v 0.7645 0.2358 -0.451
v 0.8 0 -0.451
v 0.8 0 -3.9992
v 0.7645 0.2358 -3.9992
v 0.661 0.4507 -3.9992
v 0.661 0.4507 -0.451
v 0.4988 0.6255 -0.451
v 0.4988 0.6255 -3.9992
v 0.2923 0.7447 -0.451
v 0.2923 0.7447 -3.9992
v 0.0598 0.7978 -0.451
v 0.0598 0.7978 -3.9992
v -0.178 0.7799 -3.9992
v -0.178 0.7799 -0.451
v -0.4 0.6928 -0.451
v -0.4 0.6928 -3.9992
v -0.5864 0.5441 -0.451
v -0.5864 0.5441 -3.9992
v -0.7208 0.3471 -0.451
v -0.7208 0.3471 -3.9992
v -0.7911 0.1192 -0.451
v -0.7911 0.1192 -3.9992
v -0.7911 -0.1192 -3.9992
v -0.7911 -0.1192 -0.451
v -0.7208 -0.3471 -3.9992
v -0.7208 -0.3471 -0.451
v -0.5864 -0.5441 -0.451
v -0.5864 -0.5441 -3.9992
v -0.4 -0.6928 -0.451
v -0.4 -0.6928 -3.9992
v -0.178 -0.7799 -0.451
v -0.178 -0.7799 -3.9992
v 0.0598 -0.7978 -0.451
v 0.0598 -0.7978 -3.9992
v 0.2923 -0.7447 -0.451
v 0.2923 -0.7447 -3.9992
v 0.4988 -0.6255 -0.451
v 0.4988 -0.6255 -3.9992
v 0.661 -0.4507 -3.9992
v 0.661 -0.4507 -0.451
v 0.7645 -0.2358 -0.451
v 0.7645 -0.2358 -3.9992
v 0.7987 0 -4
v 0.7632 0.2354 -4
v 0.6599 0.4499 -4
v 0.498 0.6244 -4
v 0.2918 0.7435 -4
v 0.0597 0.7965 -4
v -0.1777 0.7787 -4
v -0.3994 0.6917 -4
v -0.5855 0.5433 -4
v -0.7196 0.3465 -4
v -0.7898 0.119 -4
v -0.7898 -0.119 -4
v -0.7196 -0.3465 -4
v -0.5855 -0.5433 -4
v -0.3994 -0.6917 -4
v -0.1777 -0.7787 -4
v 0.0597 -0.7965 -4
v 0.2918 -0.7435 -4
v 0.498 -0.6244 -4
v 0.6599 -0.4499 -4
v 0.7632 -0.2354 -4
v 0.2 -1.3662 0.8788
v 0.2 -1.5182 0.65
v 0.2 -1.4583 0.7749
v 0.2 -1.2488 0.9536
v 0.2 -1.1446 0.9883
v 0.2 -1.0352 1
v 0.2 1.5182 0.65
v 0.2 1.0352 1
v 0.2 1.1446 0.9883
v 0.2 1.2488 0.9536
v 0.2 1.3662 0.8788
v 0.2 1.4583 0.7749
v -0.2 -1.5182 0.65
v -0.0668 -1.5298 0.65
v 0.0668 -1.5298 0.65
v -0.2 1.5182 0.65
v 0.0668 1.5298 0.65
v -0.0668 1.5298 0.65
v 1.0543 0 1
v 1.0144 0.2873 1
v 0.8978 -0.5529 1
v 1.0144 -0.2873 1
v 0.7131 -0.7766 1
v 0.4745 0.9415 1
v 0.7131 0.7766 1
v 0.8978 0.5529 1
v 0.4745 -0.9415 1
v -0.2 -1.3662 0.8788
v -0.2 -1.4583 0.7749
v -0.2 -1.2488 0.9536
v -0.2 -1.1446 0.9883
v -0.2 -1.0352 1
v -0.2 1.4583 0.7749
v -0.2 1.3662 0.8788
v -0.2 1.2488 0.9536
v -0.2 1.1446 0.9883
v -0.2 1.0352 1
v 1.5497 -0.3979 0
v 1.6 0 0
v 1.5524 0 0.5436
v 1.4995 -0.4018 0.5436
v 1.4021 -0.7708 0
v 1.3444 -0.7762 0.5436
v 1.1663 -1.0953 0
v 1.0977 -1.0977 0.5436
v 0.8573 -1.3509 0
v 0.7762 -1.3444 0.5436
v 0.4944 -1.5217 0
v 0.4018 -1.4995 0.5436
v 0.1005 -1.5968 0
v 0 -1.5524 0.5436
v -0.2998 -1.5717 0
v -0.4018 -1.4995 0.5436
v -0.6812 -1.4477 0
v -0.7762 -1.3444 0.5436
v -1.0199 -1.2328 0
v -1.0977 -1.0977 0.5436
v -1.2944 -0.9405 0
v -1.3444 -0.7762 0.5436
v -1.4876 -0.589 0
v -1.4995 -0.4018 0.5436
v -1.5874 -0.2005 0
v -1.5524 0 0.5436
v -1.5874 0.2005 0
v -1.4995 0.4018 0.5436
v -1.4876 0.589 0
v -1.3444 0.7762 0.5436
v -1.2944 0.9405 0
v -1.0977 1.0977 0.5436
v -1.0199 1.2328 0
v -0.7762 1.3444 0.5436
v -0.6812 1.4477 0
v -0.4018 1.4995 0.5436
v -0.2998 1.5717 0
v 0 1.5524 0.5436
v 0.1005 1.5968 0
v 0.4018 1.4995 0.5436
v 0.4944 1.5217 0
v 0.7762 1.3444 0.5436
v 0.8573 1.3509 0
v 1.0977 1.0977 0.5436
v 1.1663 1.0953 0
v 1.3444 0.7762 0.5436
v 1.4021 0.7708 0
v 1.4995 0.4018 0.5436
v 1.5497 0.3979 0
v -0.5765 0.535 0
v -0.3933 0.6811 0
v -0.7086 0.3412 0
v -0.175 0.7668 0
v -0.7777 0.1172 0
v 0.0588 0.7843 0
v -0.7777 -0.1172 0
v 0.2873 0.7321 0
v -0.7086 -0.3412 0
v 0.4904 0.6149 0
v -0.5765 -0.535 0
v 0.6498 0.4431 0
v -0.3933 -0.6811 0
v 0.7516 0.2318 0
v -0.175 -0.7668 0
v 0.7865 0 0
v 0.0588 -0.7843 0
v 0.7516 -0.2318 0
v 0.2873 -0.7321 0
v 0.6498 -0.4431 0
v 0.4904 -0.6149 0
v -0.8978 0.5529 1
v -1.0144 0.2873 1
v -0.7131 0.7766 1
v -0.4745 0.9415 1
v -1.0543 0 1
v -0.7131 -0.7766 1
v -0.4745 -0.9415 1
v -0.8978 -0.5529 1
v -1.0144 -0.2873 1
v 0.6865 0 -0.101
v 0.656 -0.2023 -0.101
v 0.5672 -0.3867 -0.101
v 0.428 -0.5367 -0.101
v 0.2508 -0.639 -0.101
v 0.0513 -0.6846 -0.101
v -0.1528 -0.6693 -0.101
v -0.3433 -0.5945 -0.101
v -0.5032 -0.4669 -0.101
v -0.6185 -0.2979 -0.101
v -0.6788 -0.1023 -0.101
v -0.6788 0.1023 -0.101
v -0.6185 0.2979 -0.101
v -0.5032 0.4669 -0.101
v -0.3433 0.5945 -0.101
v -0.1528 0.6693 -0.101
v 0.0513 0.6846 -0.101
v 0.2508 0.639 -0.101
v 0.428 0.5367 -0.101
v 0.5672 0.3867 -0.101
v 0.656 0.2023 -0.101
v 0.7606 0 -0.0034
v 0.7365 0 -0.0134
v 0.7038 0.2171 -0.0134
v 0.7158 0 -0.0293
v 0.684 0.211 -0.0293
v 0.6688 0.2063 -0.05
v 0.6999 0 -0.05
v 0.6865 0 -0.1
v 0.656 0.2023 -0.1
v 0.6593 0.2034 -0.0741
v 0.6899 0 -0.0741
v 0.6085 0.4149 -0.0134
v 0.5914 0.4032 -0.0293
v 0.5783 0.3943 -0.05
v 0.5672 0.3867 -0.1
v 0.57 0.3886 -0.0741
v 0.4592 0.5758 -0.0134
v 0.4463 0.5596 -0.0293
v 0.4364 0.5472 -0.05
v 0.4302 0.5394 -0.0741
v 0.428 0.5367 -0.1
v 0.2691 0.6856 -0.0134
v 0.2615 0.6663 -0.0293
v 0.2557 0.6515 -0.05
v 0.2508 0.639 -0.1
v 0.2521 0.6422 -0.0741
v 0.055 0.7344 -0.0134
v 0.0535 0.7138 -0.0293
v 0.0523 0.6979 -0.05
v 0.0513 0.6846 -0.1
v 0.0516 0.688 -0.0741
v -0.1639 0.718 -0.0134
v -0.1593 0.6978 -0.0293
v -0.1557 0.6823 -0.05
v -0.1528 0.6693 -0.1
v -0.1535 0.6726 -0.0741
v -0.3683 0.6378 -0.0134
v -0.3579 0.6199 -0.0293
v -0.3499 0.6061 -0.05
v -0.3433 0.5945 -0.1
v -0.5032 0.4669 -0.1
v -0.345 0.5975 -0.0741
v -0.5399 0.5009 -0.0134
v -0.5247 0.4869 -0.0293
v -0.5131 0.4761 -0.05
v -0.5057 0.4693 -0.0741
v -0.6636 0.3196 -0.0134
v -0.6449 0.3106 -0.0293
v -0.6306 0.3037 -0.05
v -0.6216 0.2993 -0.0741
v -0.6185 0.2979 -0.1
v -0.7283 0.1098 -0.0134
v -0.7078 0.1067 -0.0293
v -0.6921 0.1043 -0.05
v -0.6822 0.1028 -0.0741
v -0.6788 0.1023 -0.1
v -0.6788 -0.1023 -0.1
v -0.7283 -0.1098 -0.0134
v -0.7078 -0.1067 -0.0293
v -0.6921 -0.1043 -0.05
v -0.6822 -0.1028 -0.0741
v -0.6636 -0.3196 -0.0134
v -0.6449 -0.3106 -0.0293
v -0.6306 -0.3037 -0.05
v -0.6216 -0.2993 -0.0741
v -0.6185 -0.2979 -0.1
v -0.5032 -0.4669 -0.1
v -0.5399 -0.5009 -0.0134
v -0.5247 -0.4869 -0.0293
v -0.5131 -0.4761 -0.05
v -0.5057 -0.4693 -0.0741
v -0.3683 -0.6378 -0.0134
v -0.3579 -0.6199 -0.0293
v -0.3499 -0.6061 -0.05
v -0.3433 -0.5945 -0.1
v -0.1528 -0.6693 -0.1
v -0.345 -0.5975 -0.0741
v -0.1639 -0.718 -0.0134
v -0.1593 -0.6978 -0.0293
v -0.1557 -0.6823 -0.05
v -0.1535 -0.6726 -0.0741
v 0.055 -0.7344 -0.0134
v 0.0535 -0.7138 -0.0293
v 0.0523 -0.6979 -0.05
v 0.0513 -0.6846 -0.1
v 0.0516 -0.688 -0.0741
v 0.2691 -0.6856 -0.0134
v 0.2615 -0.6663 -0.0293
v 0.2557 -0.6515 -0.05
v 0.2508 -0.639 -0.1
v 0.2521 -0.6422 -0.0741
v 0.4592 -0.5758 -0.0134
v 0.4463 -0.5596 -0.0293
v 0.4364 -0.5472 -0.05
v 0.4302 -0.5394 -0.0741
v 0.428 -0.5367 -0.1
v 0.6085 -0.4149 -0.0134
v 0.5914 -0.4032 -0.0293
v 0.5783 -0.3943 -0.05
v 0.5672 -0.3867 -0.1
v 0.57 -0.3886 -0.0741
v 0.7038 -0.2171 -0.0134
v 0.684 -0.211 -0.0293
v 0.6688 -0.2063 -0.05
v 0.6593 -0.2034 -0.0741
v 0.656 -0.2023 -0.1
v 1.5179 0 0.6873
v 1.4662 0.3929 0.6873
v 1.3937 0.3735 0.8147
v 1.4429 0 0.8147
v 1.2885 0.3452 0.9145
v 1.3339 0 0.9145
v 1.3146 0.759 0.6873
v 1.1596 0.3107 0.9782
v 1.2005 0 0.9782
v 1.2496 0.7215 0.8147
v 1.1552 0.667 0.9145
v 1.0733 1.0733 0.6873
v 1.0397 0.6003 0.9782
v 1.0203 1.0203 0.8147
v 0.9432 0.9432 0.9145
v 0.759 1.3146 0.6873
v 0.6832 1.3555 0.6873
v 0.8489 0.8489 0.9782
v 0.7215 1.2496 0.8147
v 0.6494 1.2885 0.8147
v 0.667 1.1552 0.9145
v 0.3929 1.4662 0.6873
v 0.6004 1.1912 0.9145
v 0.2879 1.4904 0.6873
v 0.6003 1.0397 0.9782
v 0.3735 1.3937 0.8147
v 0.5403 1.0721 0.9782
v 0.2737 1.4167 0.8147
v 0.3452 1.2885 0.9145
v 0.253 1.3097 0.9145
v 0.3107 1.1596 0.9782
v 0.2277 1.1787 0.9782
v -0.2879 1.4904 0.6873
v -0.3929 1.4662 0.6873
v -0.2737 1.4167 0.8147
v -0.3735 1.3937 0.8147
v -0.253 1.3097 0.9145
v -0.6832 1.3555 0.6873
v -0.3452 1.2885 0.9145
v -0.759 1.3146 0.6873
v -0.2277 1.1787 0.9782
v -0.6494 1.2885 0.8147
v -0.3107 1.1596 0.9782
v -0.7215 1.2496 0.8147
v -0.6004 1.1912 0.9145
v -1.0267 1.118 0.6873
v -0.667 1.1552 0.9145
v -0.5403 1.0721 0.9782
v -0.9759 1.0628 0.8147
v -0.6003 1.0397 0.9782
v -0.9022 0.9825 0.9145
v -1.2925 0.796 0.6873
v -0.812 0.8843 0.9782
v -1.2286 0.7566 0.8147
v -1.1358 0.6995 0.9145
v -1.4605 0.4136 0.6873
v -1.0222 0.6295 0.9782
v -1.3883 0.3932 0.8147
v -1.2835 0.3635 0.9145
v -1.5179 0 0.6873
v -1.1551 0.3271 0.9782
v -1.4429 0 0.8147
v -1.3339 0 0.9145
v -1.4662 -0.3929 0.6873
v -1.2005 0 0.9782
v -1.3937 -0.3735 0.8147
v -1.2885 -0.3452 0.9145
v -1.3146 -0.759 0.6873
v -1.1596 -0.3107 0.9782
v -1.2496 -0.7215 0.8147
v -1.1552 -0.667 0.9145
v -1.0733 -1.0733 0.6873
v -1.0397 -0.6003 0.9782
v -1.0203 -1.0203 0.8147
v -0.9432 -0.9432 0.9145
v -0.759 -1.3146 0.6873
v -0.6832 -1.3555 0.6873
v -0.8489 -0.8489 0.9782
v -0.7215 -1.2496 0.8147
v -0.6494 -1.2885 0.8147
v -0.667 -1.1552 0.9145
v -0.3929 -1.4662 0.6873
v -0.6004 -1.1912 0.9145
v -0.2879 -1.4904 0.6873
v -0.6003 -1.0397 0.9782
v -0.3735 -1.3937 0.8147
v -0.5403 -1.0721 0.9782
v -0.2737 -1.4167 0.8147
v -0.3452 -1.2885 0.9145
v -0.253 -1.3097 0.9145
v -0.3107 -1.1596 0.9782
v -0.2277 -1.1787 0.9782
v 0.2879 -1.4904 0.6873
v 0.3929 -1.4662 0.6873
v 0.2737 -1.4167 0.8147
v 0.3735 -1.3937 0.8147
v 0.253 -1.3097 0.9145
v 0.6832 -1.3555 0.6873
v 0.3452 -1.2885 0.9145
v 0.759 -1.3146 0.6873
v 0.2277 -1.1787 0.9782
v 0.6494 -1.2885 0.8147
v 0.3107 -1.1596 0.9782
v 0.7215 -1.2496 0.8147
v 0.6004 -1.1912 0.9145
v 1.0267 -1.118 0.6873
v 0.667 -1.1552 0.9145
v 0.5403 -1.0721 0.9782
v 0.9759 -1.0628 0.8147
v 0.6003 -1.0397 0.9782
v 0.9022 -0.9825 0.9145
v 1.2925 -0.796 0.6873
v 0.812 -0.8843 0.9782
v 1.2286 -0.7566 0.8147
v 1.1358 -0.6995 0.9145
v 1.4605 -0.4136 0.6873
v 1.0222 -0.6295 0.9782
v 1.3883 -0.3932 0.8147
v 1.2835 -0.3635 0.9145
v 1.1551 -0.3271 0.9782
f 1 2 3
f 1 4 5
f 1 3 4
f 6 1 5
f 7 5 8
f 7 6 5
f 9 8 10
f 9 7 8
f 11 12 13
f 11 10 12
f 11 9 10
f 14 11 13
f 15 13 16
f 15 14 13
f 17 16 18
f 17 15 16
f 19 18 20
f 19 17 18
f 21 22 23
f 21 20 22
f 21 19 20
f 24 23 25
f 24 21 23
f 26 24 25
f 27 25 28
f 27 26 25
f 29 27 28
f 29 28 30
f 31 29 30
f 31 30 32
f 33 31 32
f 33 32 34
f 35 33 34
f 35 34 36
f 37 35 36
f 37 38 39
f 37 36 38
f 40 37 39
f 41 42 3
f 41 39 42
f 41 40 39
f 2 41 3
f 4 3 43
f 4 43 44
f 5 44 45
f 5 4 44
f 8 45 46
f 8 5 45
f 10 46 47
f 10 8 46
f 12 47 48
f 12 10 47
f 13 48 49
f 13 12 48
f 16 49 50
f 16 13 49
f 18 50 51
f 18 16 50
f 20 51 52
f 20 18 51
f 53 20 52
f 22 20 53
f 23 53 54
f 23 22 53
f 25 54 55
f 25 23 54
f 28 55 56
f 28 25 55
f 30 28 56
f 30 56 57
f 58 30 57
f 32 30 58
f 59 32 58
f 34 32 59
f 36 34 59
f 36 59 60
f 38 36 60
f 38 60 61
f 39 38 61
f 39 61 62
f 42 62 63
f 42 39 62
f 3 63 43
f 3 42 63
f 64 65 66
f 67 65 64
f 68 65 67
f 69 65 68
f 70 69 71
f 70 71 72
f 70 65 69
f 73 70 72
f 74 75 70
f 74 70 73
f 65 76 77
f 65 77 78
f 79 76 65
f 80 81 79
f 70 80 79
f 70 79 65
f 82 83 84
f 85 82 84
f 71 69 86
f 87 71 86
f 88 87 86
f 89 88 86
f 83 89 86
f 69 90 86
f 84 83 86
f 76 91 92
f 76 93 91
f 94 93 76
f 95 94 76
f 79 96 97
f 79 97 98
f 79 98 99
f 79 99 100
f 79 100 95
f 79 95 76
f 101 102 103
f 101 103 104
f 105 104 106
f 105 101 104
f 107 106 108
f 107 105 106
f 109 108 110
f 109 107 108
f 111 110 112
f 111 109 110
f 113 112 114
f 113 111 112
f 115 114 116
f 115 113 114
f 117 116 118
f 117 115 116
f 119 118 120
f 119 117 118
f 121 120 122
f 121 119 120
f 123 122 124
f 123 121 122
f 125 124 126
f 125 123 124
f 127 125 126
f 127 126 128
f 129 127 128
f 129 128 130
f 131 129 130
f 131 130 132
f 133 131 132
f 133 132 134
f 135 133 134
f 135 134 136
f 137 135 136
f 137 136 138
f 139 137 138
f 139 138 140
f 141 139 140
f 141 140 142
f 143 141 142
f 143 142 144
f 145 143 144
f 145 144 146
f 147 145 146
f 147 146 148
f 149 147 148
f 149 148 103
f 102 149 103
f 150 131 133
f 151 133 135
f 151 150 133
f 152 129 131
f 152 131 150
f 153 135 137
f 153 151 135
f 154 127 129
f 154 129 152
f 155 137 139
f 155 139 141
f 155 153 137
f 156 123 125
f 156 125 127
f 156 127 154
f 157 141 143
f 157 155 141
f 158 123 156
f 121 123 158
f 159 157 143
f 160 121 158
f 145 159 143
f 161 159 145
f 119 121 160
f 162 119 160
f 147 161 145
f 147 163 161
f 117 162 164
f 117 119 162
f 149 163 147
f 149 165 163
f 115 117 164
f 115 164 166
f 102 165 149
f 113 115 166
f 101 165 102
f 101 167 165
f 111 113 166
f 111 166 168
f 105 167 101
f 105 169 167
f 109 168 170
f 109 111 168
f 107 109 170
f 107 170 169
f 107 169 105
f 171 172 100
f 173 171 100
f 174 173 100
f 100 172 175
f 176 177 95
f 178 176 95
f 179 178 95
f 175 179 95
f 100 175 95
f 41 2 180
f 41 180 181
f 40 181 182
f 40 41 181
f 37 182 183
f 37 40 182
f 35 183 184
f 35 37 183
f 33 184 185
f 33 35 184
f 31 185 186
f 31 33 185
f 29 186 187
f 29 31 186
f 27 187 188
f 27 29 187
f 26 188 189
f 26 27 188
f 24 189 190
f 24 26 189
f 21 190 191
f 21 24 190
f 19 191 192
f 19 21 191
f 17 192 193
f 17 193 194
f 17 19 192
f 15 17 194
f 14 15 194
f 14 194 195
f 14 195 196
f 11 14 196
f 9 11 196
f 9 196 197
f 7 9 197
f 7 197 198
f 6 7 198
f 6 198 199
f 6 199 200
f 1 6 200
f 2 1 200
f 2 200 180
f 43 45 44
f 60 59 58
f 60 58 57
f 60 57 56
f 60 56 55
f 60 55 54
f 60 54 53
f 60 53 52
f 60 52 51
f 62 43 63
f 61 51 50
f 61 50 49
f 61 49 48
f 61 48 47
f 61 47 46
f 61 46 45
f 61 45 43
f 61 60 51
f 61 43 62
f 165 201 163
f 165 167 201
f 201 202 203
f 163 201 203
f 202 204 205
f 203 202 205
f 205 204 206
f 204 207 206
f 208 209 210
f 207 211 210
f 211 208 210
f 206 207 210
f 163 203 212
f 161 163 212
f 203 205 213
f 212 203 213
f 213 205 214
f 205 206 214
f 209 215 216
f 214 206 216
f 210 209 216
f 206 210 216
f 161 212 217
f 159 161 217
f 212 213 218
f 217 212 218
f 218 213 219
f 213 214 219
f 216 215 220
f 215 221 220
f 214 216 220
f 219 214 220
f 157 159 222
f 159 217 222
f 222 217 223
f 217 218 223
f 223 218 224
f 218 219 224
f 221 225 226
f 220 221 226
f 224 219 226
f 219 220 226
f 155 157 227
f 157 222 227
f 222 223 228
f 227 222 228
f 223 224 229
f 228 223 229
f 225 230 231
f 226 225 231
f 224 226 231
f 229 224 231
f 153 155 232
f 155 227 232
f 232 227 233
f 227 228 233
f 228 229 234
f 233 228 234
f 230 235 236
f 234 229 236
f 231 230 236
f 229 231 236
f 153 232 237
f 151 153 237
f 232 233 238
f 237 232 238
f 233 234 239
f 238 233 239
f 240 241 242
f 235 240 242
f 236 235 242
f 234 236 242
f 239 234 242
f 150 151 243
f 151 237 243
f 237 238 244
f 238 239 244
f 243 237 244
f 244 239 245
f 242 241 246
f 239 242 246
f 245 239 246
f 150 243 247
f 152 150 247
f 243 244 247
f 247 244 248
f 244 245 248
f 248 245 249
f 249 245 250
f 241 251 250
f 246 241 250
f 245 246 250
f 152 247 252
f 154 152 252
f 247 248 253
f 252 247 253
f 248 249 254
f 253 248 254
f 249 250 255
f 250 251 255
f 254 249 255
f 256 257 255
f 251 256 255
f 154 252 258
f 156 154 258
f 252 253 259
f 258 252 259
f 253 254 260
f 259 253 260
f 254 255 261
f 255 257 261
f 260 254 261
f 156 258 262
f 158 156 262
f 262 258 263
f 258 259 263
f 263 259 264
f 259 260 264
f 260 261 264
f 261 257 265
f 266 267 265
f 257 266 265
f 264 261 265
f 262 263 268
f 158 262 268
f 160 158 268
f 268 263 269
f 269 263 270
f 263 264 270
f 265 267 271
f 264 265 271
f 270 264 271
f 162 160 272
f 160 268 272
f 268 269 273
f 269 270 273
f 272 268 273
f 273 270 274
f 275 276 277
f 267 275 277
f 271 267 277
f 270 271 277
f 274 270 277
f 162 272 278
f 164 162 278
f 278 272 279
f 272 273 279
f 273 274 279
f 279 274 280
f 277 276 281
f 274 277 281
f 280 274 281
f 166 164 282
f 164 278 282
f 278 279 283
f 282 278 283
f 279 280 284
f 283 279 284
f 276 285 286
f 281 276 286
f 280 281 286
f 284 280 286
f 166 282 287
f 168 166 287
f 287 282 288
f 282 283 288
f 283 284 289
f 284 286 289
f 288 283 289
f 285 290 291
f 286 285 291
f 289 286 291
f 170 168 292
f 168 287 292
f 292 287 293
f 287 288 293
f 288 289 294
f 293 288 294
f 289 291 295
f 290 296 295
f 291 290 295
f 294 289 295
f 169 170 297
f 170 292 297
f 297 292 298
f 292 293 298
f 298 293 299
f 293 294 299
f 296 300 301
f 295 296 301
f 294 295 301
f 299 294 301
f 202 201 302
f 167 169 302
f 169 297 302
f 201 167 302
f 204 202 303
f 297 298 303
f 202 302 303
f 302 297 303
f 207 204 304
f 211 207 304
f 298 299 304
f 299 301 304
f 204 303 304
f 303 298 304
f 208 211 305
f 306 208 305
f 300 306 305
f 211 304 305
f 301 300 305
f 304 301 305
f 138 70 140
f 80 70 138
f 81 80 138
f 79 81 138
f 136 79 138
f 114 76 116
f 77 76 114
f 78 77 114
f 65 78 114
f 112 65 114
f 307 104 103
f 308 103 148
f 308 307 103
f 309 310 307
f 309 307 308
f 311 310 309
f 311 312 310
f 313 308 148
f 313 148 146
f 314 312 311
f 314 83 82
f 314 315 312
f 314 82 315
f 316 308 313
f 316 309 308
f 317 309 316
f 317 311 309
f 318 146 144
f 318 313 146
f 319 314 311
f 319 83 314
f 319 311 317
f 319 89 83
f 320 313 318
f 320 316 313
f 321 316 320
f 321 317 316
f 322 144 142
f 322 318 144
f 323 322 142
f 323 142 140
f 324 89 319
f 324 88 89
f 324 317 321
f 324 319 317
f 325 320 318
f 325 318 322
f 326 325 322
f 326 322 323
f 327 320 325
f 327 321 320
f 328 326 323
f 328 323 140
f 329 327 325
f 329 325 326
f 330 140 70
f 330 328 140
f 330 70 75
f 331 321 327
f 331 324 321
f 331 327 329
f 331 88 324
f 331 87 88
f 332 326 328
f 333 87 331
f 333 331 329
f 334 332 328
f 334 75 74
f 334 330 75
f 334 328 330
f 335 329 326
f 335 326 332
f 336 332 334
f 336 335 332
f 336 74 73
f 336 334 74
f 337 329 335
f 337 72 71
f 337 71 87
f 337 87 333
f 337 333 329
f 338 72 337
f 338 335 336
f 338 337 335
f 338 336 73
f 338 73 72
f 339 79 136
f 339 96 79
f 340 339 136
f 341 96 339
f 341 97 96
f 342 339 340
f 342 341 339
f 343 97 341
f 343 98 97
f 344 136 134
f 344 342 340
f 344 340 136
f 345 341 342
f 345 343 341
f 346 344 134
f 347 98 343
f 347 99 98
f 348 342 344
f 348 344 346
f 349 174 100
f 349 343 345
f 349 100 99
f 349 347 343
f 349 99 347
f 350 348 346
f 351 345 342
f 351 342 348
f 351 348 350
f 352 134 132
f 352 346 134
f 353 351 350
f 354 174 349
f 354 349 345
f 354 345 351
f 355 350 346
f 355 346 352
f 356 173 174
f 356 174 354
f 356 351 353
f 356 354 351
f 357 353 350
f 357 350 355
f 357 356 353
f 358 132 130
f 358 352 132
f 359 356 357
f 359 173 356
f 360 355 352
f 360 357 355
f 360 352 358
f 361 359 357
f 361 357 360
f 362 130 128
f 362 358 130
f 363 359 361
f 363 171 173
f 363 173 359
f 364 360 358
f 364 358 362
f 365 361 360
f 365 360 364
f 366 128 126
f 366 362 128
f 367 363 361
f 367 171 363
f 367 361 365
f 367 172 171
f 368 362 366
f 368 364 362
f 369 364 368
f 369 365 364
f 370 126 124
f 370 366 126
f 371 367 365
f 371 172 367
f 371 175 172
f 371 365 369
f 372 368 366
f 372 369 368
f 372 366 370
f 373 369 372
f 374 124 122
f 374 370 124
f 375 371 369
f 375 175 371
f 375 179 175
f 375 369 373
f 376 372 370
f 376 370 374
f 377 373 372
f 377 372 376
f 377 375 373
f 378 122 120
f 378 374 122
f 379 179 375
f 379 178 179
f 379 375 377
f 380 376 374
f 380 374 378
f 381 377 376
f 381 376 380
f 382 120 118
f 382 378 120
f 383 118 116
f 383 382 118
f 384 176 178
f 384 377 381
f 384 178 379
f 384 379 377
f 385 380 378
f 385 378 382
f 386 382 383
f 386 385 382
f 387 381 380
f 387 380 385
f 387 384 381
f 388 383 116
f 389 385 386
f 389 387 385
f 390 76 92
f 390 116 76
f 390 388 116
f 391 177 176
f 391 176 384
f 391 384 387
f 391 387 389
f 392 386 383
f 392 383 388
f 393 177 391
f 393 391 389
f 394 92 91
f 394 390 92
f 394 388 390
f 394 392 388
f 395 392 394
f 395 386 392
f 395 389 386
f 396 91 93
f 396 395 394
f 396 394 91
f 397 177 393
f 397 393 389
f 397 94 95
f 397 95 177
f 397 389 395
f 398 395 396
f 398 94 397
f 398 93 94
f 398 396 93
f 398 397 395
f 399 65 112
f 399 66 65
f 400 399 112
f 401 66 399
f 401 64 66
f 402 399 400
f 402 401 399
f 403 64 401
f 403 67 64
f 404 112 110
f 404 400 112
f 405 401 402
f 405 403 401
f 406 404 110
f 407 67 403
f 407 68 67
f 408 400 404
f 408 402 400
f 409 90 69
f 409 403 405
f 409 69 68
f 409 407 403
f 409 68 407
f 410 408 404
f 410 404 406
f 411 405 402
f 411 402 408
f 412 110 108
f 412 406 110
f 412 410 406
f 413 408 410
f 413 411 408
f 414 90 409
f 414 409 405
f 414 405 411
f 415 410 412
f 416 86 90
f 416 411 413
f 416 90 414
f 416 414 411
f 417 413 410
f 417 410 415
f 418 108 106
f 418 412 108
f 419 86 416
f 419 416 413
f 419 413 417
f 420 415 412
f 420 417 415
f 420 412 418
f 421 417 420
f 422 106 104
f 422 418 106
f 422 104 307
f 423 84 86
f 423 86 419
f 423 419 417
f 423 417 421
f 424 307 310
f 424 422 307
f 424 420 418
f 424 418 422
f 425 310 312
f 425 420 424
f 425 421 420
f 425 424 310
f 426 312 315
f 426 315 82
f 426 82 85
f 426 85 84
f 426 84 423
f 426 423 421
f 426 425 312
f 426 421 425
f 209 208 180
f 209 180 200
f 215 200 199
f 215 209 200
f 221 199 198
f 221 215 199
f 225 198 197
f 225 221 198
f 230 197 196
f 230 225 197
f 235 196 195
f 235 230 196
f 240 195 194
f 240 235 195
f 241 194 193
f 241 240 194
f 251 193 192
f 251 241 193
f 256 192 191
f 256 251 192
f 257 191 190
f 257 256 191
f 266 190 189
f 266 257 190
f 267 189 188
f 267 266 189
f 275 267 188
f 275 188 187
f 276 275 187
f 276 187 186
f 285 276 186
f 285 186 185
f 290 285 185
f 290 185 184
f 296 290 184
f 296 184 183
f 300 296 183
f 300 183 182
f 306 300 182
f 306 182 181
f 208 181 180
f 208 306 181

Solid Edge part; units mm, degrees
sketch "Sketch1" plane through (0, 0, 0) normal (0, -1, 0) x (1, 0, 0)
  line L0 (0, -4) -> (0.8, -4)
  line L1 (0.8, -4) -> (0.8, -0.451)
  line L2 (0.8, -0.451) -> (0.6865, -0.101)
  line L3 (0.6865, -0.101) -> (0.6865, 0)
  line L4 (0.6865, 0) -> (1.6, 0)
  line L5 (1.6, 0) -> (1.5125, 1)
  line L6 (1.5125, 1) -> (0, 1)
  dimension "D1" = 0.8
  dimension "D2" = 0.6865
  dimension "D3" = 4
  dimension "D4" = 3.549
  dimension "D5" = 0.35
  dimension "D6" = 1.6
  dimension "D7" = 1
revolve "RevolvedProtrusion1" add sketch "Sketch1" angle 360 about axis through (0, 0, 6) along (0, 0, -1)
fillet "Round_1" radius 0.5 1 edges at (-1.5125, 0, 1)
sketch "Sketch2" plane through (0, 0, 0) normal (0, -1, 0) x (1, 0, 0)
  line L0 (-0.2, 1) -> (-0.2, 0.65)
  line L1 (-0.2, 0.65) -> (0.2, 0.65)
  line L2 (0.2, 0.65) -> (0.2, 1)
  line L3 (0.2, 1) -> (-0.2, 1)
  dimension "D1" = 0.4
  dimension "D2" = 0.35
  dimension "D3" = 1
extrude "ExtrudedCutout_1" cut sketch "Sketch2" along normal mid plane 3.2
cosmetic_thread "Thread_1" size "M1.6" thread depth 3.549
fillet "Round_2" radius 0.1 1 edges at (-0.6865, 0, 0)
chamfer "Chamfer_1" distance 0.0013 angle 30 1 edges at (-0.8, 0, -4) measured on face at (0.5493, 0.5173, -4)
properties material "Steel"
